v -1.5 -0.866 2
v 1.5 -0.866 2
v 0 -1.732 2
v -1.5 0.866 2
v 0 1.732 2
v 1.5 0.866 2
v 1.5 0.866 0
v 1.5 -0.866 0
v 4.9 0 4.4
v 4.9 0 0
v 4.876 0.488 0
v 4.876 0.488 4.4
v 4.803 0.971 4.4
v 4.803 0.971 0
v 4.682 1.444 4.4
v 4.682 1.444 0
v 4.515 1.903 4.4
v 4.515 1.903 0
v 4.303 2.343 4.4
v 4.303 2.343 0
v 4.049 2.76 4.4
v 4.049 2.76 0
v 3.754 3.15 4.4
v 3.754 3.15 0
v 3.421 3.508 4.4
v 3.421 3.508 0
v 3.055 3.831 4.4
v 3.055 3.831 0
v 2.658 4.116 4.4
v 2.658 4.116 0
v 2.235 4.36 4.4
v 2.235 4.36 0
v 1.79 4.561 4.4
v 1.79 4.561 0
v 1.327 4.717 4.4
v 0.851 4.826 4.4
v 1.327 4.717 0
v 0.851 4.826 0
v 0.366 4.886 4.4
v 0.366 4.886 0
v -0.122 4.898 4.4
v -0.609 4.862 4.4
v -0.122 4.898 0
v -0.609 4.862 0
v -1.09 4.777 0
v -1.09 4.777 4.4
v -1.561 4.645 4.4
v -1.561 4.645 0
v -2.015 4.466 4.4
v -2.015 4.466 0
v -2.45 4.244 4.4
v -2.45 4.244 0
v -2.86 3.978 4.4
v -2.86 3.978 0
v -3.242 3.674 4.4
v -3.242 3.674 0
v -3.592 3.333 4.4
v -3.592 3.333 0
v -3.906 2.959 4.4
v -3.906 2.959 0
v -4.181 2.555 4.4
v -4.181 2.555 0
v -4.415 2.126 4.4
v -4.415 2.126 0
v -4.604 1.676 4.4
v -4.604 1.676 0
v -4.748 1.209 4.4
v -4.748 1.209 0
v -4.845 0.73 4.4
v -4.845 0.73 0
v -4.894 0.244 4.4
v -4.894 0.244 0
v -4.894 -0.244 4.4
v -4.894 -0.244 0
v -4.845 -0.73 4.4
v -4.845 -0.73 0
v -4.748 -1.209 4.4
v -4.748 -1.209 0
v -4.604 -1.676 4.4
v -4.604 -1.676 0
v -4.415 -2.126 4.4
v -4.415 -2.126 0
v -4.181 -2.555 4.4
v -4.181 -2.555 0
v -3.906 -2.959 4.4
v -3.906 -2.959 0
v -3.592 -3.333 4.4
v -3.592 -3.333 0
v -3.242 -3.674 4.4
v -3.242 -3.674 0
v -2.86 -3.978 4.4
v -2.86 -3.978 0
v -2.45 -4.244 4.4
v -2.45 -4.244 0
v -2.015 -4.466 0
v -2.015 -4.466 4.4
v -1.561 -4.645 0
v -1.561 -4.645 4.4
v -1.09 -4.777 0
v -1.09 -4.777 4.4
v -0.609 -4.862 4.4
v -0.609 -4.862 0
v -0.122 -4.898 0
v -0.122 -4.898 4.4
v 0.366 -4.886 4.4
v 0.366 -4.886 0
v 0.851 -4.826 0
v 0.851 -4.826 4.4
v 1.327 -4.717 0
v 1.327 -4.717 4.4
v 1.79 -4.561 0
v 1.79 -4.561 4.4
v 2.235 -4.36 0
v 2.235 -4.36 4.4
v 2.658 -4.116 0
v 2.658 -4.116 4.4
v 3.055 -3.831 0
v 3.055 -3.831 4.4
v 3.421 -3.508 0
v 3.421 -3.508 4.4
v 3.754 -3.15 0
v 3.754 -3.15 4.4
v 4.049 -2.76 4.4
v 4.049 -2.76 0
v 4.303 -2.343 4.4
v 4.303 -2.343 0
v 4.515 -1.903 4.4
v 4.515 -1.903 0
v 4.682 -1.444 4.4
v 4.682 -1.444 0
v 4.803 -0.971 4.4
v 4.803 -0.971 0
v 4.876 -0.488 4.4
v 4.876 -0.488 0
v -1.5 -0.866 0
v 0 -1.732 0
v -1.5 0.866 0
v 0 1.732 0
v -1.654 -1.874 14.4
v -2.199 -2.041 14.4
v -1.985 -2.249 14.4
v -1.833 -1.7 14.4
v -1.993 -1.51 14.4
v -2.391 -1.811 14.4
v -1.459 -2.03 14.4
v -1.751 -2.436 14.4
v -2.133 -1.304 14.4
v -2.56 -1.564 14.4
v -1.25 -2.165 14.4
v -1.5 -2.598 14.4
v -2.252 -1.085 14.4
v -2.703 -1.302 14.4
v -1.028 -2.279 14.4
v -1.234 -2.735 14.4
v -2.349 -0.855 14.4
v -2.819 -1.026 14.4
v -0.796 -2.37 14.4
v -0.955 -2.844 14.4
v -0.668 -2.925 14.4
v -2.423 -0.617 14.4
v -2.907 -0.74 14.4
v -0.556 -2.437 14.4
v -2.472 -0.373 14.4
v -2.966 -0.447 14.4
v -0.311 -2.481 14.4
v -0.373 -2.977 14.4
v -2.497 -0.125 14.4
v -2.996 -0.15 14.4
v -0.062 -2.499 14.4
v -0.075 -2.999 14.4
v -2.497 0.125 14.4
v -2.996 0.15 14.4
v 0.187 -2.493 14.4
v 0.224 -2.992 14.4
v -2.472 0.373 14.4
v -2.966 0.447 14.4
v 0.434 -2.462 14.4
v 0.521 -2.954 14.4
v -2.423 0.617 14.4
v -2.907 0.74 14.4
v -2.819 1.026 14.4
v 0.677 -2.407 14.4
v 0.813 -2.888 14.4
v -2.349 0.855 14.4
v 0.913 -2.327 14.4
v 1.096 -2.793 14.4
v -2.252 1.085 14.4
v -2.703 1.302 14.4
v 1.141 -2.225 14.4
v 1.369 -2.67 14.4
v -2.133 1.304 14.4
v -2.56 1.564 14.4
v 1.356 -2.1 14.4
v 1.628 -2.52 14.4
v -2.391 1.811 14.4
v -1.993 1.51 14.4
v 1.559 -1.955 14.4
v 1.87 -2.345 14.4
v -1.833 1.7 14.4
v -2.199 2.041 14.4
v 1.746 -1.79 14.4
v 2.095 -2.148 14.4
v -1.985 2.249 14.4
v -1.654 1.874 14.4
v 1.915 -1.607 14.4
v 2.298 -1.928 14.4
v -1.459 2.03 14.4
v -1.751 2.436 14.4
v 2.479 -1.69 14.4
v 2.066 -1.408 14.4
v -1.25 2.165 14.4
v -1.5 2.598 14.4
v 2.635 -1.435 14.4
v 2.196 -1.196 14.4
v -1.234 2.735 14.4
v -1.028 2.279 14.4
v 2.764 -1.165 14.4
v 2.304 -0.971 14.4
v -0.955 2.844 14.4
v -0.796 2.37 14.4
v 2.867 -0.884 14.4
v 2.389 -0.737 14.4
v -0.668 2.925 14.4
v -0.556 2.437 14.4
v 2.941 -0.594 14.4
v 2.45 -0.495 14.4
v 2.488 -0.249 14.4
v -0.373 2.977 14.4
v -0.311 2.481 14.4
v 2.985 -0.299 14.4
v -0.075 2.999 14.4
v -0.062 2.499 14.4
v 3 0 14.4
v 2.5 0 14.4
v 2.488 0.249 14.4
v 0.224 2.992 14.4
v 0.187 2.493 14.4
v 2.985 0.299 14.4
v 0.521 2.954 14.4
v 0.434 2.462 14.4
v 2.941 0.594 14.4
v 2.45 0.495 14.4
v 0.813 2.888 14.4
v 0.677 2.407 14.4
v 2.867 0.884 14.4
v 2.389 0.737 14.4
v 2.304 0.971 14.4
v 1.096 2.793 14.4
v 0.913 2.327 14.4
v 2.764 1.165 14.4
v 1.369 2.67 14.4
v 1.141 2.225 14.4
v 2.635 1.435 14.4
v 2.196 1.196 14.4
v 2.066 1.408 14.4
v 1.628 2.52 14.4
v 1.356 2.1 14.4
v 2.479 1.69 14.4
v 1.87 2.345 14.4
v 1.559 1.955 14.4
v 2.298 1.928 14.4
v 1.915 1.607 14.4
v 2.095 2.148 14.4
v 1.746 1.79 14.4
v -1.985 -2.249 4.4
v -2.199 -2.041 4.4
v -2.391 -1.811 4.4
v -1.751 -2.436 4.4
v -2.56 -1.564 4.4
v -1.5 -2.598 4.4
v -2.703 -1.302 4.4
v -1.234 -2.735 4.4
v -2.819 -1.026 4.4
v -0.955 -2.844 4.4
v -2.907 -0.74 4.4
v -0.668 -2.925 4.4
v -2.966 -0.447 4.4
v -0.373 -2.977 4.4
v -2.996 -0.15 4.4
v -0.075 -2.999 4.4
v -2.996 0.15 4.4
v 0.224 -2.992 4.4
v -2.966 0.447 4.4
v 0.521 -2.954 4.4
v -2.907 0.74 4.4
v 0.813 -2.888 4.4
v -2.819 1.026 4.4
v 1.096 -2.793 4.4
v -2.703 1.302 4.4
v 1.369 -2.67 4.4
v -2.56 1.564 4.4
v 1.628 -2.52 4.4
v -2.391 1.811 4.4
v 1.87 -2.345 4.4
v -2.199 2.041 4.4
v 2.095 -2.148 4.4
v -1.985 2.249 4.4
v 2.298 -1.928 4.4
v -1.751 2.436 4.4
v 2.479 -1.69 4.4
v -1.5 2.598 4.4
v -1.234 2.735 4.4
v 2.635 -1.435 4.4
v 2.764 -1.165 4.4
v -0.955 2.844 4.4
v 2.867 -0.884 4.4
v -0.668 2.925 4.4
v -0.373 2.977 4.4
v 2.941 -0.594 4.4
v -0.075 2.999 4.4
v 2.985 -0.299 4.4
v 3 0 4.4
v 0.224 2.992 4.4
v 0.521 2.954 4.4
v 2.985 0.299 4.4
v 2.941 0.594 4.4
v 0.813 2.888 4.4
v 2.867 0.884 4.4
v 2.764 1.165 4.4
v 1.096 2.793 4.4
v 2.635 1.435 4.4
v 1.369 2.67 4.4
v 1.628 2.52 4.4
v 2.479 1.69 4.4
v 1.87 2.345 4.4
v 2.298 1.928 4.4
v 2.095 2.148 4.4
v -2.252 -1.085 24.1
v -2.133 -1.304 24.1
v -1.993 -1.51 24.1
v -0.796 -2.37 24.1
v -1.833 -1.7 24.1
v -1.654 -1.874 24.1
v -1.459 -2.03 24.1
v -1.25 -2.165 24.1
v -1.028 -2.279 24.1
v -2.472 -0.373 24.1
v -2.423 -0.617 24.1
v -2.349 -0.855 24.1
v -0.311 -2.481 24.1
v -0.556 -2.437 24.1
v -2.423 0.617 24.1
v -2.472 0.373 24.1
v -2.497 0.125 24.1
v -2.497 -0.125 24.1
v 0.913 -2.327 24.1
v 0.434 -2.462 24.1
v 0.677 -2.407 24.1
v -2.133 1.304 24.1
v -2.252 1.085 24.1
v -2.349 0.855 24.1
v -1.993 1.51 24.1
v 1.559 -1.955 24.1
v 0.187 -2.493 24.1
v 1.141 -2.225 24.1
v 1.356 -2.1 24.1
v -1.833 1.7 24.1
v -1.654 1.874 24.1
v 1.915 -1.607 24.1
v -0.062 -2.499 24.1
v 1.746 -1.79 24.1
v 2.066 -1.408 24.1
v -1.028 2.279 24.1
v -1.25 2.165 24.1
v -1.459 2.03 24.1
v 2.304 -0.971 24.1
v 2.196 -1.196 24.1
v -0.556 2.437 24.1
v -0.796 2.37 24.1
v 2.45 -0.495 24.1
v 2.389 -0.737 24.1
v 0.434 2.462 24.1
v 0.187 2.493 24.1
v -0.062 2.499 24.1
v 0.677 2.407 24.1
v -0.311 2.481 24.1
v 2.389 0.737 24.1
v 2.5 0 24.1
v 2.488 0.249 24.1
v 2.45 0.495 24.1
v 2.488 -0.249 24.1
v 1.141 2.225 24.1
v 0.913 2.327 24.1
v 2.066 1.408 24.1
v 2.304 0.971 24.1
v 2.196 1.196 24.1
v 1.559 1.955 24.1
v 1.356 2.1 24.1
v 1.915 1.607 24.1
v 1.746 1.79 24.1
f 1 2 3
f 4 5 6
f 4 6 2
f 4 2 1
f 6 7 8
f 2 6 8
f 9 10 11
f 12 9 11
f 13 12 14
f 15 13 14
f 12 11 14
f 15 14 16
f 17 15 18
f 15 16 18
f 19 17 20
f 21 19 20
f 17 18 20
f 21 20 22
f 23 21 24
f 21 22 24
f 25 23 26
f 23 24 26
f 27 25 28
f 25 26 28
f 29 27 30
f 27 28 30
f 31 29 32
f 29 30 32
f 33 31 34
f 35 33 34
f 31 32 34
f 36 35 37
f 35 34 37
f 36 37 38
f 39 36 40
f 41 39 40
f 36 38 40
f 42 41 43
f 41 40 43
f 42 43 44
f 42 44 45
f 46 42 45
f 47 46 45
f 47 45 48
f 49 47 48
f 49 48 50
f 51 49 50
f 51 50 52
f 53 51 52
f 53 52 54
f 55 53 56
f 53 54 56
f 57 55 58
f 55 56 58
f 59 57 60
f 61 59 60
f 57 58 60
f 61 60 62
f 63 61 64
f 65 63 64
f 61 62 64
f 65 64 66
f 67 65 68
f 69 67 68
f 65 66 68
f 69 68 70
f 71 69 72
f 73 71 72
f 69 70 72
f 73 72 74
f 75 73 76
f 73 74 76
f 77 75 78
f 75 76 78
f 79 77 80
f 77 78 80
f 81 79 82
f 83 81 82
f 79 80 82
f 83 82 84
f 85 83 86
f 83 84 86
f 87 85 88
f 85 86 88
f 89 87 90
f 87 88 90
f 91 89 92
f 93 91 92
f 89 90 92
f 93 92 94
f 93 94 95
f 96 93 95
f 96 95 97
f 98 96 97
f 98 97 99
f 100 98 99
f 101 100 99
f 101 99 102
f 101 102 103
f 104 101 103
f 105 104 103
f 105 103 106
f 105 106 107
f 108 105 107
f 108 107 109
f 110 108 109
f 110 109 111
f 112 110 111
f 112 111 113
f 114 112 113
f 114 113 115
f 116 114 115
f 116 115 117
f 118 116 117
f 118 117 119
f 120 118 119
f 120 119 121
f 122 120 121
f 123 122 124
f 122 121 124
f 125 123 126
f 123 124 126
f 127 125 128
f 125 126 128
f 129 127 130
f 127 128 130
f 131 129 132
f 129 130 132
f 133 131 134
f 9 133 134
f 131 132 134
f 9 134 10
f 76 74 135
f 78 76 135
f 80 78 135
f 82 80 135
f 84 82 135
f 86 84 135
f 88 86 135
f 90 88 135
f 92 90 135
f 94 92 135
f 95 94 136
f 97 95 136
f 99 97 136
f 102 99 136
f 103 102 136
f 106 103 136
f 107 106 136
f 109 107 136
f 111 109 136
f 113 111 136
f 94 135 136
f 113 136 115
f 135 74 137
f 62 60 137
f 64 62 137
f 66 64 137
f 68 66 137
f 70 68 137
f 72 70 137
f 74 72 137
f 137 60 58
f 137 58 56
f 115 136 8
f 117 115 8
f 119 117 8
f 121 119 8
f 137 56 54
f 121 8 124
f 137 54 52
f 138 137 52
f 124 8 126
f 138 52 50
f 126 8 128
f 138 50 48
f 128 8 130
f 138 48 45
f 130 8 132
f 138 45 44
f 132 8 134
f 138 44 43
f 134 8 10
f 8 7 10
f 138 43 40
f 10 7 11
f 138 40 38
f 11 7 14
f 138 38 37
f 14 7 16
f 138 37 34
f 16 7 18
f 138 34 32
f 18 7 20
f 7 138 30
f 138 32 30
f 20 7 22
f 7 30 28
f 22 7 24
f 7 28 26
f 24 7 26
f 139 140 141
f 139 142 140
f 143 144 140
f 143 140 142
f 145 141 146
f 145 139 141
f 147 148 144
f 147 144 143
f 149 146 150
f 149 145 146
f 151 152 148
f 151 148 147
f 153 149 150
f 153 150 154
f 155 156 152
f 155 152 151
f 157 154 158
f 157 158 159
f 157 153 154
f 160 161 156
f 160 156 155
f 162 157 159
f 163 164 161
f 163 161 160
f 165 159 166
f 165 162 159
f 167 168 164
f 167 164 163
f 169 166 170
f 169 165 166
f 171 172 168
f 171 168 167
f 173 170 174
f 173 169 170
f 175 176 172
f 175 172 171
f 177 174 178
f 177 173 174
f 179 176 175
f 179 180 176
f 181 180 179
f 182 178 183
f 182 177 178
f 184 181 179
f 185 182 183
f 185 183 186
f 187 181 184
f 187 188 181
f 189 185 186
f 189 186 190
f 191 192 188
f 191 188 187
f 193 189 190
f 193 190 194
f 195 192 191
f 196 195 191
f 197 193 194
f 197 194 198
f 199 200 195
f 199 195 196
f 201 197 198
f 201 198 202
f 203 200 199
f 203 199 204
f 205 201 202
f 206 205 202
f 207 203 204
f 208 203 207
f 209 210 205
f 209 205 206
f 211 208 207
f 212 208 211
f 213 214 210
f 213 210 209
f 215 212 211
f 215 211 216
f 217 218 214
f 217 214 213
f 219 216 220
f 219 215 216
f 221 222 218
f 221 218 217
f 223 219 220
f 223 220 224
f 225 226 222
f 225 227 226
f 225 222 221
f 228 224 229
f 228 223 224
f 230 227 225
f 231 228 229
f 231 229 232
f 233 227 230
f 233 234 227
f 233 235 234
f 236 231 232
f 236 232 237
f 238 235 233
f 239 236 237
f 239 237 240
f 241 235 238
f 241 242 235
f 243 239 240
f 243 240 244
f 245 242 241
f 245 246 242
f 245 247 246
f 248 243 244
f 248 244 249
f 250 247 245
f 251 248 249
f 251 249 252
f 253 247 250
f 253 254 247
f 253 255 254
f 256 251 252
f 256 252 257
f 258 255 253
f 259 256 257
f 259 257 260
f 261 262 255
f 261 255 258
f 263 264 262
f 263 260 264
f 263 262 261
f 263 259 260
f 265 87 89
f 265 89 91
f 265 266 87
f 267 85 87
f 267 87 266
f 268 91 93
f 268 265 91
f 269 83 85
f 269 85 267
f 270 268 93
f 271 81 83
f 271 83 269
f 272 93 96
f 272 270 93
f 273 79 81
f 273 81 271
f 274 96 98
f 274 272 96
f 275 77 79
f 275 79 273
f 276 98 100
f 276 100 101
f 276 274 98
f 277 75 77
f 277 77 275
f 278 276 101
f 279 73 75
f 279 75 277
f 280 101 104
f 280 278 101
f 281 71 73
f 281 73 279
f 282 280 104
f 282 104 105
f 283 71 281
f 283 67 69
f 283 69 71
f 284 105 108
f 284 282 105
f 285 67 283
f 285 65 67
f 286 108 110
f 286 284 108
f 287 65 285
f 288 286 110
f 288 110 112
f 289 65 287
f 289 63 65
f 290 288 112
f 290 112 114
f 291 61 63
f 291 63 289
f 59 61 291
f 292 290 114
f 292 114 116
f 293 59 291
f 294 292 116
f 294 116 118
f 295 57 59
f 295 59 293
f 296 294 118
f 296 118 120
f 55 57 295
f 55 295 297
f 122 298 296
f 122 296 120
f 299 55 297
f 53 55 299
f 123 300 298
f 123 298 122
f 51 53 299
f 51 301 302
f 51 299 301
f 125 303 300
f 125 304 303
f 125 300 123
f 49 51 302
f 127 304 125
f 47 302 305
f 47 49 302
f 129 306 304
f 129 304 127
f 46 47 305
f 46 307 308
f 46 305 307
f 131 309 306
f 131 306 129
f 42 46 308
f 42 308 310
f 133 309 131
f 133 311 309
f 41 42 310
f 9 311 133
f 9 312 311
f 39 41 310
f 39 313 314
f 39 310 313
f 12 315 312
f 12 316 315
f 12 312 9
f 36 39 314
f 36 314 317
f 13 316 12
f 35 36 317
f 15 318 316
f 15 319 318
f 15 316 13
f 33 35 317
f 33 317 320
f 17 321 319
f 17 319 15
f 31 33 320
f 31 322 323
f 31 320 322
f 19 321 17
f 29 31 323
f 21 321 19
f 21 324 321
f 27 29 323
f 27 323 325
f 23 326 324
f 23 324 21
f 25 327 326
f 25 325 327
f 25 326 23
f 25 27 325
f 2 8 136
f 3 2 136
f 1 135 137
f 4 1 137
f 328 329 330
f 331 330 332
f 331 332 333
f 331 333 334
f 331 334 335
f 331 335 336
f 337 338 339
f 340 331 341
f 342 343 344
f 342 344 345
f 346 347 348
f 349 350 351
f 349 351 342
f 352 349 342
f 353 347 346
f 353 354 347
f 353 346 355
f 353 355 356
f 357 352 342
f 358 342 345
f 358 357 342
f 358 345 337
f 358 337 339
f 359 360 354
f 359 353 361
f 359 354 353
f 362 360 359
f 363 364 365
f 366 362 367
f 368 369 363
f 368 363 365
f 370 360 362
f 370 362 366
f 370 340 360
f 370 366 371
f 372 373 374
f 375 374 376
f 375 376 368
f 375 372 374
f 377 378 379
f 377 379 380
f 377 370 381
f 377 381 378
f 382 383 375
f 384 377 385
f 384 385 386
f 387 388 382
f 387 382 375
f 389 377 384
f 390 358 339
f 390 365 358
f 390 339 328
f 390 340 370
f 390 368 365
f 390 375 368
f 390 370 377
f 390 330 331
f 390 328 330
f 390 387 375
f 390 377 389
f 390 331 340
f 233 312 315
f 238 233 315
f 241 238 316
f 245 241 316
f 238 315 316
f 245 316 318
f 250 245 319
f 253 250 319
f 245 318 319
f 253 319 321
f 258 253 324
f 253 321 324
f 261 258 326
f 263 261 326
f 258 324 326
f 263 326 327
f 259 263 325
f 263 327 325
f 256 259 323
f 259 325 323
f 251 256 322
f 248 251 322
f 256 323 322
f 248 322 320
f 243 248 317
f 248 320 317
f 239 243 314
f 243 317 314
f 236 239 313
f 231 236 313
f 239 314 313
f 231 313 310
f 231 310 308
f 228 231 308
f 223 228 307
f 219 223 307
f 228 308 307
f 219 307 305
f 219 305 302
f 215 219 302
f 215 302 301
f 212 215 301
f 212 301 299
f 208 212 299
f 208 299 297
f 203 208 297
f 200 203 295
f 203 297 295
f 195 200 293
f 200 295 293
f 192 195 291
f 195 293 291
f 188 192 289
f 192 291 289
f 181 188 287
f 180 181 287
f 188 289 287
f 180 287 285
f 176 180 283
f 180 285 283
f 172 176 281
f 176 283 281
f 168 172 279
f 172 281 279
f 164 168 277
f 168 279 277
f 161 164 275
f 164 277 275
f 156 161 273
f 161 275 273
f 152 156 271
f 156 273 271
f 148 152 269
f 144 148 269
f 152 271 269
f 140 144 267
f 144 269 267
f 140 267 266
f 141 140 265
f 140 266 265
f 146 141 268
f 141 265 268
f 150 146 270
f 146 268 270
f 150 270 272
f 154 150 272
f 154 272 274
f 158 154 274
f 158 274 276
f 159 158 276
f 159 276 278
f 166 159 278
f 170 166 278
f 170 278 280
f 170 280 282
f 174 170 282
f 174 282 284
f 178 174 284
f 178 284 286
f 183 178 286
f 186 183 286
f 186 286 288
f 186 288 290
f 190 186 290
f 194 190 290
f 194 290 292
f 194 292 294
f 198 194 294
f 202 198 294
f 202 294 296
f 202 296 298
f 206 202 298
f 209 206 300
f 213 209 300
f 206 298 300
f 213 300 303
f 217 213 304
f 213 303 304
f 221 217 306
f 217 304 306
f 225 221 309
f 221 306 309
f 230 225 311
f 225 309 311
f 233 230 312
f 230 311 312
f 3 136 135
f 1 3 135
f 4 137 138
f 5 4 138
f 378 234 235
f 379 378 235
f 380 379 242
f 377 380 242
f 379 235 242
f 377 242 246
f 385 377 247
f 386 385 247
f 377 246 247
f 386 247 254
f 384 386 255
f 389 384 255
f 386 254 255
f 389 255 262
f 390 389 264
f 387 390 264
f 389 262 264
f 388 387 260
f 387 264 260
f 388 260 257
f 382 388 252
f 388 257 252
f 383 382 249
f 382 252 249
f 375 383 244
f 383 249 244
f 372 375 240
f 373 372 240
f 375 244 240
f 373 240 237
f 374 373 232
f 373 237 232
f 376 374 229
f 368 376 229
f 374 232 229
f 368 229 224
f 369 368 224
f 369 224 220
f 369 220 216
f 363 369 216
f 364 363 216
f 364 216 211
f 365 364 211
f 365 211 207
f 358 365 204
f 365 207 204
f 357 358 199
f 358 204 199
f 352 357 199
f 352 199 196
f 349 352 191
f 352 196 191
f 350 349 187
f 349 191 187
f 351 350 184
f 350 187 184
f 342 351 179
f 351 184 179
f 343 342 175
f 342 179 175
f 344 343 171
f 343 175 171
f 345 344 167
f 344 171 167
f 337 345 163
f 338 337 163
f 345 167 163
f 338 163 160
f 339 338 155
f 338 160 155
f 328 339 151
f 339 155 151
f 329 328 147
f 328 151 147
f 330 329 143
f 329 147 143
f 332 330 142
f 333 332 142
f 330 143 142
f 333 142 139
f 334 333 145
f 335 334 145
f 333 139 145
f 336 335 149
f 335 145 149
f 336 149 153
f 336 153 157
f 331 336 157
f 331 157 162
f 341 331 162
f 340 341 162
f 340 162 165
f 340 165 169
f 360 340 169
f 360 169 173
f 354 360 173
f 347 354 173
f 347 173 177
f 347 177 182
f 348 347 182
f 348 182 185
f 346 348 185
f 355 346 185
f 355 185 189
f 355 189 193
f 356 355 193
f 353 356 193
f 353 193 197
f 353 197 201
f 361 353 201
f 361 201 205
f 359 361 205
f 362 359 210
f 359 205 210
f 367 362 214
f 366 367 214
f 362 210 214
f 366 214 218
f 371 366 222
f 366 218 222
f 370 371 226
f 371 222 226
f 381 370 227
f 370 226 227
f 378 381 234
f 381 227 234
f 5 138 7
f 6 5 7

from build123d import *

# Parameters (mm, degrees)
SKETCH_1_R          = 4.9
EXTRUDE_1_DEPTH     = 4.4
SKETCH_2_R          = 3
EXTRUDE_2_DEPTH     = 10
SKETCH_3_R          = 2.5
EXTRUDE_3_DEPTH     = 9.7
CUT_EXTRUDE_1_DEPTH = 2


with BuildPart() as part:
    # 草图1 → 凸台-拉伸1 (new body)
    with BuildSketch(Plane.XY):
        Circle(SKETCH_1_R)
    extrude(amount=EXTRUDE_1_DEPTH)

    # 草图2 → 凸台-拉伸2 (add)
    with BuildSketch(Plane.XY.offset(4.4)):
        Circle(SKETCH_2_R)
    extrude(amount=EXTRUDE_2_DEPTH)

    # 草图3 → 凸台-拉伸3 (add)
    with BuildSketch(Plane.XY.offset(14.4)):
        Circle(SKETCH_3_R)
    extrude(amount=EXTRUDE_3_DEPTH)

    # 草图4 → 切除-拉伸1 (cut)
    with BuildSketch(Plane(origin=(0, 0, 0), x_dir=(-1, 0, 0), z_dir=(0, 0, -1))):
        Polygon((0, 1.732050808), (-1.5, 0.866025404), (-1.5, -0.866025404), (0, -1.732050808), (1.5, -0.866025404), (1.5, 0.866025404), align=None)
    extrude(amount=-CUT_EXTRUDE_1_DEPTH, mode=Mode.SUBTRACT)


solid = part.part
